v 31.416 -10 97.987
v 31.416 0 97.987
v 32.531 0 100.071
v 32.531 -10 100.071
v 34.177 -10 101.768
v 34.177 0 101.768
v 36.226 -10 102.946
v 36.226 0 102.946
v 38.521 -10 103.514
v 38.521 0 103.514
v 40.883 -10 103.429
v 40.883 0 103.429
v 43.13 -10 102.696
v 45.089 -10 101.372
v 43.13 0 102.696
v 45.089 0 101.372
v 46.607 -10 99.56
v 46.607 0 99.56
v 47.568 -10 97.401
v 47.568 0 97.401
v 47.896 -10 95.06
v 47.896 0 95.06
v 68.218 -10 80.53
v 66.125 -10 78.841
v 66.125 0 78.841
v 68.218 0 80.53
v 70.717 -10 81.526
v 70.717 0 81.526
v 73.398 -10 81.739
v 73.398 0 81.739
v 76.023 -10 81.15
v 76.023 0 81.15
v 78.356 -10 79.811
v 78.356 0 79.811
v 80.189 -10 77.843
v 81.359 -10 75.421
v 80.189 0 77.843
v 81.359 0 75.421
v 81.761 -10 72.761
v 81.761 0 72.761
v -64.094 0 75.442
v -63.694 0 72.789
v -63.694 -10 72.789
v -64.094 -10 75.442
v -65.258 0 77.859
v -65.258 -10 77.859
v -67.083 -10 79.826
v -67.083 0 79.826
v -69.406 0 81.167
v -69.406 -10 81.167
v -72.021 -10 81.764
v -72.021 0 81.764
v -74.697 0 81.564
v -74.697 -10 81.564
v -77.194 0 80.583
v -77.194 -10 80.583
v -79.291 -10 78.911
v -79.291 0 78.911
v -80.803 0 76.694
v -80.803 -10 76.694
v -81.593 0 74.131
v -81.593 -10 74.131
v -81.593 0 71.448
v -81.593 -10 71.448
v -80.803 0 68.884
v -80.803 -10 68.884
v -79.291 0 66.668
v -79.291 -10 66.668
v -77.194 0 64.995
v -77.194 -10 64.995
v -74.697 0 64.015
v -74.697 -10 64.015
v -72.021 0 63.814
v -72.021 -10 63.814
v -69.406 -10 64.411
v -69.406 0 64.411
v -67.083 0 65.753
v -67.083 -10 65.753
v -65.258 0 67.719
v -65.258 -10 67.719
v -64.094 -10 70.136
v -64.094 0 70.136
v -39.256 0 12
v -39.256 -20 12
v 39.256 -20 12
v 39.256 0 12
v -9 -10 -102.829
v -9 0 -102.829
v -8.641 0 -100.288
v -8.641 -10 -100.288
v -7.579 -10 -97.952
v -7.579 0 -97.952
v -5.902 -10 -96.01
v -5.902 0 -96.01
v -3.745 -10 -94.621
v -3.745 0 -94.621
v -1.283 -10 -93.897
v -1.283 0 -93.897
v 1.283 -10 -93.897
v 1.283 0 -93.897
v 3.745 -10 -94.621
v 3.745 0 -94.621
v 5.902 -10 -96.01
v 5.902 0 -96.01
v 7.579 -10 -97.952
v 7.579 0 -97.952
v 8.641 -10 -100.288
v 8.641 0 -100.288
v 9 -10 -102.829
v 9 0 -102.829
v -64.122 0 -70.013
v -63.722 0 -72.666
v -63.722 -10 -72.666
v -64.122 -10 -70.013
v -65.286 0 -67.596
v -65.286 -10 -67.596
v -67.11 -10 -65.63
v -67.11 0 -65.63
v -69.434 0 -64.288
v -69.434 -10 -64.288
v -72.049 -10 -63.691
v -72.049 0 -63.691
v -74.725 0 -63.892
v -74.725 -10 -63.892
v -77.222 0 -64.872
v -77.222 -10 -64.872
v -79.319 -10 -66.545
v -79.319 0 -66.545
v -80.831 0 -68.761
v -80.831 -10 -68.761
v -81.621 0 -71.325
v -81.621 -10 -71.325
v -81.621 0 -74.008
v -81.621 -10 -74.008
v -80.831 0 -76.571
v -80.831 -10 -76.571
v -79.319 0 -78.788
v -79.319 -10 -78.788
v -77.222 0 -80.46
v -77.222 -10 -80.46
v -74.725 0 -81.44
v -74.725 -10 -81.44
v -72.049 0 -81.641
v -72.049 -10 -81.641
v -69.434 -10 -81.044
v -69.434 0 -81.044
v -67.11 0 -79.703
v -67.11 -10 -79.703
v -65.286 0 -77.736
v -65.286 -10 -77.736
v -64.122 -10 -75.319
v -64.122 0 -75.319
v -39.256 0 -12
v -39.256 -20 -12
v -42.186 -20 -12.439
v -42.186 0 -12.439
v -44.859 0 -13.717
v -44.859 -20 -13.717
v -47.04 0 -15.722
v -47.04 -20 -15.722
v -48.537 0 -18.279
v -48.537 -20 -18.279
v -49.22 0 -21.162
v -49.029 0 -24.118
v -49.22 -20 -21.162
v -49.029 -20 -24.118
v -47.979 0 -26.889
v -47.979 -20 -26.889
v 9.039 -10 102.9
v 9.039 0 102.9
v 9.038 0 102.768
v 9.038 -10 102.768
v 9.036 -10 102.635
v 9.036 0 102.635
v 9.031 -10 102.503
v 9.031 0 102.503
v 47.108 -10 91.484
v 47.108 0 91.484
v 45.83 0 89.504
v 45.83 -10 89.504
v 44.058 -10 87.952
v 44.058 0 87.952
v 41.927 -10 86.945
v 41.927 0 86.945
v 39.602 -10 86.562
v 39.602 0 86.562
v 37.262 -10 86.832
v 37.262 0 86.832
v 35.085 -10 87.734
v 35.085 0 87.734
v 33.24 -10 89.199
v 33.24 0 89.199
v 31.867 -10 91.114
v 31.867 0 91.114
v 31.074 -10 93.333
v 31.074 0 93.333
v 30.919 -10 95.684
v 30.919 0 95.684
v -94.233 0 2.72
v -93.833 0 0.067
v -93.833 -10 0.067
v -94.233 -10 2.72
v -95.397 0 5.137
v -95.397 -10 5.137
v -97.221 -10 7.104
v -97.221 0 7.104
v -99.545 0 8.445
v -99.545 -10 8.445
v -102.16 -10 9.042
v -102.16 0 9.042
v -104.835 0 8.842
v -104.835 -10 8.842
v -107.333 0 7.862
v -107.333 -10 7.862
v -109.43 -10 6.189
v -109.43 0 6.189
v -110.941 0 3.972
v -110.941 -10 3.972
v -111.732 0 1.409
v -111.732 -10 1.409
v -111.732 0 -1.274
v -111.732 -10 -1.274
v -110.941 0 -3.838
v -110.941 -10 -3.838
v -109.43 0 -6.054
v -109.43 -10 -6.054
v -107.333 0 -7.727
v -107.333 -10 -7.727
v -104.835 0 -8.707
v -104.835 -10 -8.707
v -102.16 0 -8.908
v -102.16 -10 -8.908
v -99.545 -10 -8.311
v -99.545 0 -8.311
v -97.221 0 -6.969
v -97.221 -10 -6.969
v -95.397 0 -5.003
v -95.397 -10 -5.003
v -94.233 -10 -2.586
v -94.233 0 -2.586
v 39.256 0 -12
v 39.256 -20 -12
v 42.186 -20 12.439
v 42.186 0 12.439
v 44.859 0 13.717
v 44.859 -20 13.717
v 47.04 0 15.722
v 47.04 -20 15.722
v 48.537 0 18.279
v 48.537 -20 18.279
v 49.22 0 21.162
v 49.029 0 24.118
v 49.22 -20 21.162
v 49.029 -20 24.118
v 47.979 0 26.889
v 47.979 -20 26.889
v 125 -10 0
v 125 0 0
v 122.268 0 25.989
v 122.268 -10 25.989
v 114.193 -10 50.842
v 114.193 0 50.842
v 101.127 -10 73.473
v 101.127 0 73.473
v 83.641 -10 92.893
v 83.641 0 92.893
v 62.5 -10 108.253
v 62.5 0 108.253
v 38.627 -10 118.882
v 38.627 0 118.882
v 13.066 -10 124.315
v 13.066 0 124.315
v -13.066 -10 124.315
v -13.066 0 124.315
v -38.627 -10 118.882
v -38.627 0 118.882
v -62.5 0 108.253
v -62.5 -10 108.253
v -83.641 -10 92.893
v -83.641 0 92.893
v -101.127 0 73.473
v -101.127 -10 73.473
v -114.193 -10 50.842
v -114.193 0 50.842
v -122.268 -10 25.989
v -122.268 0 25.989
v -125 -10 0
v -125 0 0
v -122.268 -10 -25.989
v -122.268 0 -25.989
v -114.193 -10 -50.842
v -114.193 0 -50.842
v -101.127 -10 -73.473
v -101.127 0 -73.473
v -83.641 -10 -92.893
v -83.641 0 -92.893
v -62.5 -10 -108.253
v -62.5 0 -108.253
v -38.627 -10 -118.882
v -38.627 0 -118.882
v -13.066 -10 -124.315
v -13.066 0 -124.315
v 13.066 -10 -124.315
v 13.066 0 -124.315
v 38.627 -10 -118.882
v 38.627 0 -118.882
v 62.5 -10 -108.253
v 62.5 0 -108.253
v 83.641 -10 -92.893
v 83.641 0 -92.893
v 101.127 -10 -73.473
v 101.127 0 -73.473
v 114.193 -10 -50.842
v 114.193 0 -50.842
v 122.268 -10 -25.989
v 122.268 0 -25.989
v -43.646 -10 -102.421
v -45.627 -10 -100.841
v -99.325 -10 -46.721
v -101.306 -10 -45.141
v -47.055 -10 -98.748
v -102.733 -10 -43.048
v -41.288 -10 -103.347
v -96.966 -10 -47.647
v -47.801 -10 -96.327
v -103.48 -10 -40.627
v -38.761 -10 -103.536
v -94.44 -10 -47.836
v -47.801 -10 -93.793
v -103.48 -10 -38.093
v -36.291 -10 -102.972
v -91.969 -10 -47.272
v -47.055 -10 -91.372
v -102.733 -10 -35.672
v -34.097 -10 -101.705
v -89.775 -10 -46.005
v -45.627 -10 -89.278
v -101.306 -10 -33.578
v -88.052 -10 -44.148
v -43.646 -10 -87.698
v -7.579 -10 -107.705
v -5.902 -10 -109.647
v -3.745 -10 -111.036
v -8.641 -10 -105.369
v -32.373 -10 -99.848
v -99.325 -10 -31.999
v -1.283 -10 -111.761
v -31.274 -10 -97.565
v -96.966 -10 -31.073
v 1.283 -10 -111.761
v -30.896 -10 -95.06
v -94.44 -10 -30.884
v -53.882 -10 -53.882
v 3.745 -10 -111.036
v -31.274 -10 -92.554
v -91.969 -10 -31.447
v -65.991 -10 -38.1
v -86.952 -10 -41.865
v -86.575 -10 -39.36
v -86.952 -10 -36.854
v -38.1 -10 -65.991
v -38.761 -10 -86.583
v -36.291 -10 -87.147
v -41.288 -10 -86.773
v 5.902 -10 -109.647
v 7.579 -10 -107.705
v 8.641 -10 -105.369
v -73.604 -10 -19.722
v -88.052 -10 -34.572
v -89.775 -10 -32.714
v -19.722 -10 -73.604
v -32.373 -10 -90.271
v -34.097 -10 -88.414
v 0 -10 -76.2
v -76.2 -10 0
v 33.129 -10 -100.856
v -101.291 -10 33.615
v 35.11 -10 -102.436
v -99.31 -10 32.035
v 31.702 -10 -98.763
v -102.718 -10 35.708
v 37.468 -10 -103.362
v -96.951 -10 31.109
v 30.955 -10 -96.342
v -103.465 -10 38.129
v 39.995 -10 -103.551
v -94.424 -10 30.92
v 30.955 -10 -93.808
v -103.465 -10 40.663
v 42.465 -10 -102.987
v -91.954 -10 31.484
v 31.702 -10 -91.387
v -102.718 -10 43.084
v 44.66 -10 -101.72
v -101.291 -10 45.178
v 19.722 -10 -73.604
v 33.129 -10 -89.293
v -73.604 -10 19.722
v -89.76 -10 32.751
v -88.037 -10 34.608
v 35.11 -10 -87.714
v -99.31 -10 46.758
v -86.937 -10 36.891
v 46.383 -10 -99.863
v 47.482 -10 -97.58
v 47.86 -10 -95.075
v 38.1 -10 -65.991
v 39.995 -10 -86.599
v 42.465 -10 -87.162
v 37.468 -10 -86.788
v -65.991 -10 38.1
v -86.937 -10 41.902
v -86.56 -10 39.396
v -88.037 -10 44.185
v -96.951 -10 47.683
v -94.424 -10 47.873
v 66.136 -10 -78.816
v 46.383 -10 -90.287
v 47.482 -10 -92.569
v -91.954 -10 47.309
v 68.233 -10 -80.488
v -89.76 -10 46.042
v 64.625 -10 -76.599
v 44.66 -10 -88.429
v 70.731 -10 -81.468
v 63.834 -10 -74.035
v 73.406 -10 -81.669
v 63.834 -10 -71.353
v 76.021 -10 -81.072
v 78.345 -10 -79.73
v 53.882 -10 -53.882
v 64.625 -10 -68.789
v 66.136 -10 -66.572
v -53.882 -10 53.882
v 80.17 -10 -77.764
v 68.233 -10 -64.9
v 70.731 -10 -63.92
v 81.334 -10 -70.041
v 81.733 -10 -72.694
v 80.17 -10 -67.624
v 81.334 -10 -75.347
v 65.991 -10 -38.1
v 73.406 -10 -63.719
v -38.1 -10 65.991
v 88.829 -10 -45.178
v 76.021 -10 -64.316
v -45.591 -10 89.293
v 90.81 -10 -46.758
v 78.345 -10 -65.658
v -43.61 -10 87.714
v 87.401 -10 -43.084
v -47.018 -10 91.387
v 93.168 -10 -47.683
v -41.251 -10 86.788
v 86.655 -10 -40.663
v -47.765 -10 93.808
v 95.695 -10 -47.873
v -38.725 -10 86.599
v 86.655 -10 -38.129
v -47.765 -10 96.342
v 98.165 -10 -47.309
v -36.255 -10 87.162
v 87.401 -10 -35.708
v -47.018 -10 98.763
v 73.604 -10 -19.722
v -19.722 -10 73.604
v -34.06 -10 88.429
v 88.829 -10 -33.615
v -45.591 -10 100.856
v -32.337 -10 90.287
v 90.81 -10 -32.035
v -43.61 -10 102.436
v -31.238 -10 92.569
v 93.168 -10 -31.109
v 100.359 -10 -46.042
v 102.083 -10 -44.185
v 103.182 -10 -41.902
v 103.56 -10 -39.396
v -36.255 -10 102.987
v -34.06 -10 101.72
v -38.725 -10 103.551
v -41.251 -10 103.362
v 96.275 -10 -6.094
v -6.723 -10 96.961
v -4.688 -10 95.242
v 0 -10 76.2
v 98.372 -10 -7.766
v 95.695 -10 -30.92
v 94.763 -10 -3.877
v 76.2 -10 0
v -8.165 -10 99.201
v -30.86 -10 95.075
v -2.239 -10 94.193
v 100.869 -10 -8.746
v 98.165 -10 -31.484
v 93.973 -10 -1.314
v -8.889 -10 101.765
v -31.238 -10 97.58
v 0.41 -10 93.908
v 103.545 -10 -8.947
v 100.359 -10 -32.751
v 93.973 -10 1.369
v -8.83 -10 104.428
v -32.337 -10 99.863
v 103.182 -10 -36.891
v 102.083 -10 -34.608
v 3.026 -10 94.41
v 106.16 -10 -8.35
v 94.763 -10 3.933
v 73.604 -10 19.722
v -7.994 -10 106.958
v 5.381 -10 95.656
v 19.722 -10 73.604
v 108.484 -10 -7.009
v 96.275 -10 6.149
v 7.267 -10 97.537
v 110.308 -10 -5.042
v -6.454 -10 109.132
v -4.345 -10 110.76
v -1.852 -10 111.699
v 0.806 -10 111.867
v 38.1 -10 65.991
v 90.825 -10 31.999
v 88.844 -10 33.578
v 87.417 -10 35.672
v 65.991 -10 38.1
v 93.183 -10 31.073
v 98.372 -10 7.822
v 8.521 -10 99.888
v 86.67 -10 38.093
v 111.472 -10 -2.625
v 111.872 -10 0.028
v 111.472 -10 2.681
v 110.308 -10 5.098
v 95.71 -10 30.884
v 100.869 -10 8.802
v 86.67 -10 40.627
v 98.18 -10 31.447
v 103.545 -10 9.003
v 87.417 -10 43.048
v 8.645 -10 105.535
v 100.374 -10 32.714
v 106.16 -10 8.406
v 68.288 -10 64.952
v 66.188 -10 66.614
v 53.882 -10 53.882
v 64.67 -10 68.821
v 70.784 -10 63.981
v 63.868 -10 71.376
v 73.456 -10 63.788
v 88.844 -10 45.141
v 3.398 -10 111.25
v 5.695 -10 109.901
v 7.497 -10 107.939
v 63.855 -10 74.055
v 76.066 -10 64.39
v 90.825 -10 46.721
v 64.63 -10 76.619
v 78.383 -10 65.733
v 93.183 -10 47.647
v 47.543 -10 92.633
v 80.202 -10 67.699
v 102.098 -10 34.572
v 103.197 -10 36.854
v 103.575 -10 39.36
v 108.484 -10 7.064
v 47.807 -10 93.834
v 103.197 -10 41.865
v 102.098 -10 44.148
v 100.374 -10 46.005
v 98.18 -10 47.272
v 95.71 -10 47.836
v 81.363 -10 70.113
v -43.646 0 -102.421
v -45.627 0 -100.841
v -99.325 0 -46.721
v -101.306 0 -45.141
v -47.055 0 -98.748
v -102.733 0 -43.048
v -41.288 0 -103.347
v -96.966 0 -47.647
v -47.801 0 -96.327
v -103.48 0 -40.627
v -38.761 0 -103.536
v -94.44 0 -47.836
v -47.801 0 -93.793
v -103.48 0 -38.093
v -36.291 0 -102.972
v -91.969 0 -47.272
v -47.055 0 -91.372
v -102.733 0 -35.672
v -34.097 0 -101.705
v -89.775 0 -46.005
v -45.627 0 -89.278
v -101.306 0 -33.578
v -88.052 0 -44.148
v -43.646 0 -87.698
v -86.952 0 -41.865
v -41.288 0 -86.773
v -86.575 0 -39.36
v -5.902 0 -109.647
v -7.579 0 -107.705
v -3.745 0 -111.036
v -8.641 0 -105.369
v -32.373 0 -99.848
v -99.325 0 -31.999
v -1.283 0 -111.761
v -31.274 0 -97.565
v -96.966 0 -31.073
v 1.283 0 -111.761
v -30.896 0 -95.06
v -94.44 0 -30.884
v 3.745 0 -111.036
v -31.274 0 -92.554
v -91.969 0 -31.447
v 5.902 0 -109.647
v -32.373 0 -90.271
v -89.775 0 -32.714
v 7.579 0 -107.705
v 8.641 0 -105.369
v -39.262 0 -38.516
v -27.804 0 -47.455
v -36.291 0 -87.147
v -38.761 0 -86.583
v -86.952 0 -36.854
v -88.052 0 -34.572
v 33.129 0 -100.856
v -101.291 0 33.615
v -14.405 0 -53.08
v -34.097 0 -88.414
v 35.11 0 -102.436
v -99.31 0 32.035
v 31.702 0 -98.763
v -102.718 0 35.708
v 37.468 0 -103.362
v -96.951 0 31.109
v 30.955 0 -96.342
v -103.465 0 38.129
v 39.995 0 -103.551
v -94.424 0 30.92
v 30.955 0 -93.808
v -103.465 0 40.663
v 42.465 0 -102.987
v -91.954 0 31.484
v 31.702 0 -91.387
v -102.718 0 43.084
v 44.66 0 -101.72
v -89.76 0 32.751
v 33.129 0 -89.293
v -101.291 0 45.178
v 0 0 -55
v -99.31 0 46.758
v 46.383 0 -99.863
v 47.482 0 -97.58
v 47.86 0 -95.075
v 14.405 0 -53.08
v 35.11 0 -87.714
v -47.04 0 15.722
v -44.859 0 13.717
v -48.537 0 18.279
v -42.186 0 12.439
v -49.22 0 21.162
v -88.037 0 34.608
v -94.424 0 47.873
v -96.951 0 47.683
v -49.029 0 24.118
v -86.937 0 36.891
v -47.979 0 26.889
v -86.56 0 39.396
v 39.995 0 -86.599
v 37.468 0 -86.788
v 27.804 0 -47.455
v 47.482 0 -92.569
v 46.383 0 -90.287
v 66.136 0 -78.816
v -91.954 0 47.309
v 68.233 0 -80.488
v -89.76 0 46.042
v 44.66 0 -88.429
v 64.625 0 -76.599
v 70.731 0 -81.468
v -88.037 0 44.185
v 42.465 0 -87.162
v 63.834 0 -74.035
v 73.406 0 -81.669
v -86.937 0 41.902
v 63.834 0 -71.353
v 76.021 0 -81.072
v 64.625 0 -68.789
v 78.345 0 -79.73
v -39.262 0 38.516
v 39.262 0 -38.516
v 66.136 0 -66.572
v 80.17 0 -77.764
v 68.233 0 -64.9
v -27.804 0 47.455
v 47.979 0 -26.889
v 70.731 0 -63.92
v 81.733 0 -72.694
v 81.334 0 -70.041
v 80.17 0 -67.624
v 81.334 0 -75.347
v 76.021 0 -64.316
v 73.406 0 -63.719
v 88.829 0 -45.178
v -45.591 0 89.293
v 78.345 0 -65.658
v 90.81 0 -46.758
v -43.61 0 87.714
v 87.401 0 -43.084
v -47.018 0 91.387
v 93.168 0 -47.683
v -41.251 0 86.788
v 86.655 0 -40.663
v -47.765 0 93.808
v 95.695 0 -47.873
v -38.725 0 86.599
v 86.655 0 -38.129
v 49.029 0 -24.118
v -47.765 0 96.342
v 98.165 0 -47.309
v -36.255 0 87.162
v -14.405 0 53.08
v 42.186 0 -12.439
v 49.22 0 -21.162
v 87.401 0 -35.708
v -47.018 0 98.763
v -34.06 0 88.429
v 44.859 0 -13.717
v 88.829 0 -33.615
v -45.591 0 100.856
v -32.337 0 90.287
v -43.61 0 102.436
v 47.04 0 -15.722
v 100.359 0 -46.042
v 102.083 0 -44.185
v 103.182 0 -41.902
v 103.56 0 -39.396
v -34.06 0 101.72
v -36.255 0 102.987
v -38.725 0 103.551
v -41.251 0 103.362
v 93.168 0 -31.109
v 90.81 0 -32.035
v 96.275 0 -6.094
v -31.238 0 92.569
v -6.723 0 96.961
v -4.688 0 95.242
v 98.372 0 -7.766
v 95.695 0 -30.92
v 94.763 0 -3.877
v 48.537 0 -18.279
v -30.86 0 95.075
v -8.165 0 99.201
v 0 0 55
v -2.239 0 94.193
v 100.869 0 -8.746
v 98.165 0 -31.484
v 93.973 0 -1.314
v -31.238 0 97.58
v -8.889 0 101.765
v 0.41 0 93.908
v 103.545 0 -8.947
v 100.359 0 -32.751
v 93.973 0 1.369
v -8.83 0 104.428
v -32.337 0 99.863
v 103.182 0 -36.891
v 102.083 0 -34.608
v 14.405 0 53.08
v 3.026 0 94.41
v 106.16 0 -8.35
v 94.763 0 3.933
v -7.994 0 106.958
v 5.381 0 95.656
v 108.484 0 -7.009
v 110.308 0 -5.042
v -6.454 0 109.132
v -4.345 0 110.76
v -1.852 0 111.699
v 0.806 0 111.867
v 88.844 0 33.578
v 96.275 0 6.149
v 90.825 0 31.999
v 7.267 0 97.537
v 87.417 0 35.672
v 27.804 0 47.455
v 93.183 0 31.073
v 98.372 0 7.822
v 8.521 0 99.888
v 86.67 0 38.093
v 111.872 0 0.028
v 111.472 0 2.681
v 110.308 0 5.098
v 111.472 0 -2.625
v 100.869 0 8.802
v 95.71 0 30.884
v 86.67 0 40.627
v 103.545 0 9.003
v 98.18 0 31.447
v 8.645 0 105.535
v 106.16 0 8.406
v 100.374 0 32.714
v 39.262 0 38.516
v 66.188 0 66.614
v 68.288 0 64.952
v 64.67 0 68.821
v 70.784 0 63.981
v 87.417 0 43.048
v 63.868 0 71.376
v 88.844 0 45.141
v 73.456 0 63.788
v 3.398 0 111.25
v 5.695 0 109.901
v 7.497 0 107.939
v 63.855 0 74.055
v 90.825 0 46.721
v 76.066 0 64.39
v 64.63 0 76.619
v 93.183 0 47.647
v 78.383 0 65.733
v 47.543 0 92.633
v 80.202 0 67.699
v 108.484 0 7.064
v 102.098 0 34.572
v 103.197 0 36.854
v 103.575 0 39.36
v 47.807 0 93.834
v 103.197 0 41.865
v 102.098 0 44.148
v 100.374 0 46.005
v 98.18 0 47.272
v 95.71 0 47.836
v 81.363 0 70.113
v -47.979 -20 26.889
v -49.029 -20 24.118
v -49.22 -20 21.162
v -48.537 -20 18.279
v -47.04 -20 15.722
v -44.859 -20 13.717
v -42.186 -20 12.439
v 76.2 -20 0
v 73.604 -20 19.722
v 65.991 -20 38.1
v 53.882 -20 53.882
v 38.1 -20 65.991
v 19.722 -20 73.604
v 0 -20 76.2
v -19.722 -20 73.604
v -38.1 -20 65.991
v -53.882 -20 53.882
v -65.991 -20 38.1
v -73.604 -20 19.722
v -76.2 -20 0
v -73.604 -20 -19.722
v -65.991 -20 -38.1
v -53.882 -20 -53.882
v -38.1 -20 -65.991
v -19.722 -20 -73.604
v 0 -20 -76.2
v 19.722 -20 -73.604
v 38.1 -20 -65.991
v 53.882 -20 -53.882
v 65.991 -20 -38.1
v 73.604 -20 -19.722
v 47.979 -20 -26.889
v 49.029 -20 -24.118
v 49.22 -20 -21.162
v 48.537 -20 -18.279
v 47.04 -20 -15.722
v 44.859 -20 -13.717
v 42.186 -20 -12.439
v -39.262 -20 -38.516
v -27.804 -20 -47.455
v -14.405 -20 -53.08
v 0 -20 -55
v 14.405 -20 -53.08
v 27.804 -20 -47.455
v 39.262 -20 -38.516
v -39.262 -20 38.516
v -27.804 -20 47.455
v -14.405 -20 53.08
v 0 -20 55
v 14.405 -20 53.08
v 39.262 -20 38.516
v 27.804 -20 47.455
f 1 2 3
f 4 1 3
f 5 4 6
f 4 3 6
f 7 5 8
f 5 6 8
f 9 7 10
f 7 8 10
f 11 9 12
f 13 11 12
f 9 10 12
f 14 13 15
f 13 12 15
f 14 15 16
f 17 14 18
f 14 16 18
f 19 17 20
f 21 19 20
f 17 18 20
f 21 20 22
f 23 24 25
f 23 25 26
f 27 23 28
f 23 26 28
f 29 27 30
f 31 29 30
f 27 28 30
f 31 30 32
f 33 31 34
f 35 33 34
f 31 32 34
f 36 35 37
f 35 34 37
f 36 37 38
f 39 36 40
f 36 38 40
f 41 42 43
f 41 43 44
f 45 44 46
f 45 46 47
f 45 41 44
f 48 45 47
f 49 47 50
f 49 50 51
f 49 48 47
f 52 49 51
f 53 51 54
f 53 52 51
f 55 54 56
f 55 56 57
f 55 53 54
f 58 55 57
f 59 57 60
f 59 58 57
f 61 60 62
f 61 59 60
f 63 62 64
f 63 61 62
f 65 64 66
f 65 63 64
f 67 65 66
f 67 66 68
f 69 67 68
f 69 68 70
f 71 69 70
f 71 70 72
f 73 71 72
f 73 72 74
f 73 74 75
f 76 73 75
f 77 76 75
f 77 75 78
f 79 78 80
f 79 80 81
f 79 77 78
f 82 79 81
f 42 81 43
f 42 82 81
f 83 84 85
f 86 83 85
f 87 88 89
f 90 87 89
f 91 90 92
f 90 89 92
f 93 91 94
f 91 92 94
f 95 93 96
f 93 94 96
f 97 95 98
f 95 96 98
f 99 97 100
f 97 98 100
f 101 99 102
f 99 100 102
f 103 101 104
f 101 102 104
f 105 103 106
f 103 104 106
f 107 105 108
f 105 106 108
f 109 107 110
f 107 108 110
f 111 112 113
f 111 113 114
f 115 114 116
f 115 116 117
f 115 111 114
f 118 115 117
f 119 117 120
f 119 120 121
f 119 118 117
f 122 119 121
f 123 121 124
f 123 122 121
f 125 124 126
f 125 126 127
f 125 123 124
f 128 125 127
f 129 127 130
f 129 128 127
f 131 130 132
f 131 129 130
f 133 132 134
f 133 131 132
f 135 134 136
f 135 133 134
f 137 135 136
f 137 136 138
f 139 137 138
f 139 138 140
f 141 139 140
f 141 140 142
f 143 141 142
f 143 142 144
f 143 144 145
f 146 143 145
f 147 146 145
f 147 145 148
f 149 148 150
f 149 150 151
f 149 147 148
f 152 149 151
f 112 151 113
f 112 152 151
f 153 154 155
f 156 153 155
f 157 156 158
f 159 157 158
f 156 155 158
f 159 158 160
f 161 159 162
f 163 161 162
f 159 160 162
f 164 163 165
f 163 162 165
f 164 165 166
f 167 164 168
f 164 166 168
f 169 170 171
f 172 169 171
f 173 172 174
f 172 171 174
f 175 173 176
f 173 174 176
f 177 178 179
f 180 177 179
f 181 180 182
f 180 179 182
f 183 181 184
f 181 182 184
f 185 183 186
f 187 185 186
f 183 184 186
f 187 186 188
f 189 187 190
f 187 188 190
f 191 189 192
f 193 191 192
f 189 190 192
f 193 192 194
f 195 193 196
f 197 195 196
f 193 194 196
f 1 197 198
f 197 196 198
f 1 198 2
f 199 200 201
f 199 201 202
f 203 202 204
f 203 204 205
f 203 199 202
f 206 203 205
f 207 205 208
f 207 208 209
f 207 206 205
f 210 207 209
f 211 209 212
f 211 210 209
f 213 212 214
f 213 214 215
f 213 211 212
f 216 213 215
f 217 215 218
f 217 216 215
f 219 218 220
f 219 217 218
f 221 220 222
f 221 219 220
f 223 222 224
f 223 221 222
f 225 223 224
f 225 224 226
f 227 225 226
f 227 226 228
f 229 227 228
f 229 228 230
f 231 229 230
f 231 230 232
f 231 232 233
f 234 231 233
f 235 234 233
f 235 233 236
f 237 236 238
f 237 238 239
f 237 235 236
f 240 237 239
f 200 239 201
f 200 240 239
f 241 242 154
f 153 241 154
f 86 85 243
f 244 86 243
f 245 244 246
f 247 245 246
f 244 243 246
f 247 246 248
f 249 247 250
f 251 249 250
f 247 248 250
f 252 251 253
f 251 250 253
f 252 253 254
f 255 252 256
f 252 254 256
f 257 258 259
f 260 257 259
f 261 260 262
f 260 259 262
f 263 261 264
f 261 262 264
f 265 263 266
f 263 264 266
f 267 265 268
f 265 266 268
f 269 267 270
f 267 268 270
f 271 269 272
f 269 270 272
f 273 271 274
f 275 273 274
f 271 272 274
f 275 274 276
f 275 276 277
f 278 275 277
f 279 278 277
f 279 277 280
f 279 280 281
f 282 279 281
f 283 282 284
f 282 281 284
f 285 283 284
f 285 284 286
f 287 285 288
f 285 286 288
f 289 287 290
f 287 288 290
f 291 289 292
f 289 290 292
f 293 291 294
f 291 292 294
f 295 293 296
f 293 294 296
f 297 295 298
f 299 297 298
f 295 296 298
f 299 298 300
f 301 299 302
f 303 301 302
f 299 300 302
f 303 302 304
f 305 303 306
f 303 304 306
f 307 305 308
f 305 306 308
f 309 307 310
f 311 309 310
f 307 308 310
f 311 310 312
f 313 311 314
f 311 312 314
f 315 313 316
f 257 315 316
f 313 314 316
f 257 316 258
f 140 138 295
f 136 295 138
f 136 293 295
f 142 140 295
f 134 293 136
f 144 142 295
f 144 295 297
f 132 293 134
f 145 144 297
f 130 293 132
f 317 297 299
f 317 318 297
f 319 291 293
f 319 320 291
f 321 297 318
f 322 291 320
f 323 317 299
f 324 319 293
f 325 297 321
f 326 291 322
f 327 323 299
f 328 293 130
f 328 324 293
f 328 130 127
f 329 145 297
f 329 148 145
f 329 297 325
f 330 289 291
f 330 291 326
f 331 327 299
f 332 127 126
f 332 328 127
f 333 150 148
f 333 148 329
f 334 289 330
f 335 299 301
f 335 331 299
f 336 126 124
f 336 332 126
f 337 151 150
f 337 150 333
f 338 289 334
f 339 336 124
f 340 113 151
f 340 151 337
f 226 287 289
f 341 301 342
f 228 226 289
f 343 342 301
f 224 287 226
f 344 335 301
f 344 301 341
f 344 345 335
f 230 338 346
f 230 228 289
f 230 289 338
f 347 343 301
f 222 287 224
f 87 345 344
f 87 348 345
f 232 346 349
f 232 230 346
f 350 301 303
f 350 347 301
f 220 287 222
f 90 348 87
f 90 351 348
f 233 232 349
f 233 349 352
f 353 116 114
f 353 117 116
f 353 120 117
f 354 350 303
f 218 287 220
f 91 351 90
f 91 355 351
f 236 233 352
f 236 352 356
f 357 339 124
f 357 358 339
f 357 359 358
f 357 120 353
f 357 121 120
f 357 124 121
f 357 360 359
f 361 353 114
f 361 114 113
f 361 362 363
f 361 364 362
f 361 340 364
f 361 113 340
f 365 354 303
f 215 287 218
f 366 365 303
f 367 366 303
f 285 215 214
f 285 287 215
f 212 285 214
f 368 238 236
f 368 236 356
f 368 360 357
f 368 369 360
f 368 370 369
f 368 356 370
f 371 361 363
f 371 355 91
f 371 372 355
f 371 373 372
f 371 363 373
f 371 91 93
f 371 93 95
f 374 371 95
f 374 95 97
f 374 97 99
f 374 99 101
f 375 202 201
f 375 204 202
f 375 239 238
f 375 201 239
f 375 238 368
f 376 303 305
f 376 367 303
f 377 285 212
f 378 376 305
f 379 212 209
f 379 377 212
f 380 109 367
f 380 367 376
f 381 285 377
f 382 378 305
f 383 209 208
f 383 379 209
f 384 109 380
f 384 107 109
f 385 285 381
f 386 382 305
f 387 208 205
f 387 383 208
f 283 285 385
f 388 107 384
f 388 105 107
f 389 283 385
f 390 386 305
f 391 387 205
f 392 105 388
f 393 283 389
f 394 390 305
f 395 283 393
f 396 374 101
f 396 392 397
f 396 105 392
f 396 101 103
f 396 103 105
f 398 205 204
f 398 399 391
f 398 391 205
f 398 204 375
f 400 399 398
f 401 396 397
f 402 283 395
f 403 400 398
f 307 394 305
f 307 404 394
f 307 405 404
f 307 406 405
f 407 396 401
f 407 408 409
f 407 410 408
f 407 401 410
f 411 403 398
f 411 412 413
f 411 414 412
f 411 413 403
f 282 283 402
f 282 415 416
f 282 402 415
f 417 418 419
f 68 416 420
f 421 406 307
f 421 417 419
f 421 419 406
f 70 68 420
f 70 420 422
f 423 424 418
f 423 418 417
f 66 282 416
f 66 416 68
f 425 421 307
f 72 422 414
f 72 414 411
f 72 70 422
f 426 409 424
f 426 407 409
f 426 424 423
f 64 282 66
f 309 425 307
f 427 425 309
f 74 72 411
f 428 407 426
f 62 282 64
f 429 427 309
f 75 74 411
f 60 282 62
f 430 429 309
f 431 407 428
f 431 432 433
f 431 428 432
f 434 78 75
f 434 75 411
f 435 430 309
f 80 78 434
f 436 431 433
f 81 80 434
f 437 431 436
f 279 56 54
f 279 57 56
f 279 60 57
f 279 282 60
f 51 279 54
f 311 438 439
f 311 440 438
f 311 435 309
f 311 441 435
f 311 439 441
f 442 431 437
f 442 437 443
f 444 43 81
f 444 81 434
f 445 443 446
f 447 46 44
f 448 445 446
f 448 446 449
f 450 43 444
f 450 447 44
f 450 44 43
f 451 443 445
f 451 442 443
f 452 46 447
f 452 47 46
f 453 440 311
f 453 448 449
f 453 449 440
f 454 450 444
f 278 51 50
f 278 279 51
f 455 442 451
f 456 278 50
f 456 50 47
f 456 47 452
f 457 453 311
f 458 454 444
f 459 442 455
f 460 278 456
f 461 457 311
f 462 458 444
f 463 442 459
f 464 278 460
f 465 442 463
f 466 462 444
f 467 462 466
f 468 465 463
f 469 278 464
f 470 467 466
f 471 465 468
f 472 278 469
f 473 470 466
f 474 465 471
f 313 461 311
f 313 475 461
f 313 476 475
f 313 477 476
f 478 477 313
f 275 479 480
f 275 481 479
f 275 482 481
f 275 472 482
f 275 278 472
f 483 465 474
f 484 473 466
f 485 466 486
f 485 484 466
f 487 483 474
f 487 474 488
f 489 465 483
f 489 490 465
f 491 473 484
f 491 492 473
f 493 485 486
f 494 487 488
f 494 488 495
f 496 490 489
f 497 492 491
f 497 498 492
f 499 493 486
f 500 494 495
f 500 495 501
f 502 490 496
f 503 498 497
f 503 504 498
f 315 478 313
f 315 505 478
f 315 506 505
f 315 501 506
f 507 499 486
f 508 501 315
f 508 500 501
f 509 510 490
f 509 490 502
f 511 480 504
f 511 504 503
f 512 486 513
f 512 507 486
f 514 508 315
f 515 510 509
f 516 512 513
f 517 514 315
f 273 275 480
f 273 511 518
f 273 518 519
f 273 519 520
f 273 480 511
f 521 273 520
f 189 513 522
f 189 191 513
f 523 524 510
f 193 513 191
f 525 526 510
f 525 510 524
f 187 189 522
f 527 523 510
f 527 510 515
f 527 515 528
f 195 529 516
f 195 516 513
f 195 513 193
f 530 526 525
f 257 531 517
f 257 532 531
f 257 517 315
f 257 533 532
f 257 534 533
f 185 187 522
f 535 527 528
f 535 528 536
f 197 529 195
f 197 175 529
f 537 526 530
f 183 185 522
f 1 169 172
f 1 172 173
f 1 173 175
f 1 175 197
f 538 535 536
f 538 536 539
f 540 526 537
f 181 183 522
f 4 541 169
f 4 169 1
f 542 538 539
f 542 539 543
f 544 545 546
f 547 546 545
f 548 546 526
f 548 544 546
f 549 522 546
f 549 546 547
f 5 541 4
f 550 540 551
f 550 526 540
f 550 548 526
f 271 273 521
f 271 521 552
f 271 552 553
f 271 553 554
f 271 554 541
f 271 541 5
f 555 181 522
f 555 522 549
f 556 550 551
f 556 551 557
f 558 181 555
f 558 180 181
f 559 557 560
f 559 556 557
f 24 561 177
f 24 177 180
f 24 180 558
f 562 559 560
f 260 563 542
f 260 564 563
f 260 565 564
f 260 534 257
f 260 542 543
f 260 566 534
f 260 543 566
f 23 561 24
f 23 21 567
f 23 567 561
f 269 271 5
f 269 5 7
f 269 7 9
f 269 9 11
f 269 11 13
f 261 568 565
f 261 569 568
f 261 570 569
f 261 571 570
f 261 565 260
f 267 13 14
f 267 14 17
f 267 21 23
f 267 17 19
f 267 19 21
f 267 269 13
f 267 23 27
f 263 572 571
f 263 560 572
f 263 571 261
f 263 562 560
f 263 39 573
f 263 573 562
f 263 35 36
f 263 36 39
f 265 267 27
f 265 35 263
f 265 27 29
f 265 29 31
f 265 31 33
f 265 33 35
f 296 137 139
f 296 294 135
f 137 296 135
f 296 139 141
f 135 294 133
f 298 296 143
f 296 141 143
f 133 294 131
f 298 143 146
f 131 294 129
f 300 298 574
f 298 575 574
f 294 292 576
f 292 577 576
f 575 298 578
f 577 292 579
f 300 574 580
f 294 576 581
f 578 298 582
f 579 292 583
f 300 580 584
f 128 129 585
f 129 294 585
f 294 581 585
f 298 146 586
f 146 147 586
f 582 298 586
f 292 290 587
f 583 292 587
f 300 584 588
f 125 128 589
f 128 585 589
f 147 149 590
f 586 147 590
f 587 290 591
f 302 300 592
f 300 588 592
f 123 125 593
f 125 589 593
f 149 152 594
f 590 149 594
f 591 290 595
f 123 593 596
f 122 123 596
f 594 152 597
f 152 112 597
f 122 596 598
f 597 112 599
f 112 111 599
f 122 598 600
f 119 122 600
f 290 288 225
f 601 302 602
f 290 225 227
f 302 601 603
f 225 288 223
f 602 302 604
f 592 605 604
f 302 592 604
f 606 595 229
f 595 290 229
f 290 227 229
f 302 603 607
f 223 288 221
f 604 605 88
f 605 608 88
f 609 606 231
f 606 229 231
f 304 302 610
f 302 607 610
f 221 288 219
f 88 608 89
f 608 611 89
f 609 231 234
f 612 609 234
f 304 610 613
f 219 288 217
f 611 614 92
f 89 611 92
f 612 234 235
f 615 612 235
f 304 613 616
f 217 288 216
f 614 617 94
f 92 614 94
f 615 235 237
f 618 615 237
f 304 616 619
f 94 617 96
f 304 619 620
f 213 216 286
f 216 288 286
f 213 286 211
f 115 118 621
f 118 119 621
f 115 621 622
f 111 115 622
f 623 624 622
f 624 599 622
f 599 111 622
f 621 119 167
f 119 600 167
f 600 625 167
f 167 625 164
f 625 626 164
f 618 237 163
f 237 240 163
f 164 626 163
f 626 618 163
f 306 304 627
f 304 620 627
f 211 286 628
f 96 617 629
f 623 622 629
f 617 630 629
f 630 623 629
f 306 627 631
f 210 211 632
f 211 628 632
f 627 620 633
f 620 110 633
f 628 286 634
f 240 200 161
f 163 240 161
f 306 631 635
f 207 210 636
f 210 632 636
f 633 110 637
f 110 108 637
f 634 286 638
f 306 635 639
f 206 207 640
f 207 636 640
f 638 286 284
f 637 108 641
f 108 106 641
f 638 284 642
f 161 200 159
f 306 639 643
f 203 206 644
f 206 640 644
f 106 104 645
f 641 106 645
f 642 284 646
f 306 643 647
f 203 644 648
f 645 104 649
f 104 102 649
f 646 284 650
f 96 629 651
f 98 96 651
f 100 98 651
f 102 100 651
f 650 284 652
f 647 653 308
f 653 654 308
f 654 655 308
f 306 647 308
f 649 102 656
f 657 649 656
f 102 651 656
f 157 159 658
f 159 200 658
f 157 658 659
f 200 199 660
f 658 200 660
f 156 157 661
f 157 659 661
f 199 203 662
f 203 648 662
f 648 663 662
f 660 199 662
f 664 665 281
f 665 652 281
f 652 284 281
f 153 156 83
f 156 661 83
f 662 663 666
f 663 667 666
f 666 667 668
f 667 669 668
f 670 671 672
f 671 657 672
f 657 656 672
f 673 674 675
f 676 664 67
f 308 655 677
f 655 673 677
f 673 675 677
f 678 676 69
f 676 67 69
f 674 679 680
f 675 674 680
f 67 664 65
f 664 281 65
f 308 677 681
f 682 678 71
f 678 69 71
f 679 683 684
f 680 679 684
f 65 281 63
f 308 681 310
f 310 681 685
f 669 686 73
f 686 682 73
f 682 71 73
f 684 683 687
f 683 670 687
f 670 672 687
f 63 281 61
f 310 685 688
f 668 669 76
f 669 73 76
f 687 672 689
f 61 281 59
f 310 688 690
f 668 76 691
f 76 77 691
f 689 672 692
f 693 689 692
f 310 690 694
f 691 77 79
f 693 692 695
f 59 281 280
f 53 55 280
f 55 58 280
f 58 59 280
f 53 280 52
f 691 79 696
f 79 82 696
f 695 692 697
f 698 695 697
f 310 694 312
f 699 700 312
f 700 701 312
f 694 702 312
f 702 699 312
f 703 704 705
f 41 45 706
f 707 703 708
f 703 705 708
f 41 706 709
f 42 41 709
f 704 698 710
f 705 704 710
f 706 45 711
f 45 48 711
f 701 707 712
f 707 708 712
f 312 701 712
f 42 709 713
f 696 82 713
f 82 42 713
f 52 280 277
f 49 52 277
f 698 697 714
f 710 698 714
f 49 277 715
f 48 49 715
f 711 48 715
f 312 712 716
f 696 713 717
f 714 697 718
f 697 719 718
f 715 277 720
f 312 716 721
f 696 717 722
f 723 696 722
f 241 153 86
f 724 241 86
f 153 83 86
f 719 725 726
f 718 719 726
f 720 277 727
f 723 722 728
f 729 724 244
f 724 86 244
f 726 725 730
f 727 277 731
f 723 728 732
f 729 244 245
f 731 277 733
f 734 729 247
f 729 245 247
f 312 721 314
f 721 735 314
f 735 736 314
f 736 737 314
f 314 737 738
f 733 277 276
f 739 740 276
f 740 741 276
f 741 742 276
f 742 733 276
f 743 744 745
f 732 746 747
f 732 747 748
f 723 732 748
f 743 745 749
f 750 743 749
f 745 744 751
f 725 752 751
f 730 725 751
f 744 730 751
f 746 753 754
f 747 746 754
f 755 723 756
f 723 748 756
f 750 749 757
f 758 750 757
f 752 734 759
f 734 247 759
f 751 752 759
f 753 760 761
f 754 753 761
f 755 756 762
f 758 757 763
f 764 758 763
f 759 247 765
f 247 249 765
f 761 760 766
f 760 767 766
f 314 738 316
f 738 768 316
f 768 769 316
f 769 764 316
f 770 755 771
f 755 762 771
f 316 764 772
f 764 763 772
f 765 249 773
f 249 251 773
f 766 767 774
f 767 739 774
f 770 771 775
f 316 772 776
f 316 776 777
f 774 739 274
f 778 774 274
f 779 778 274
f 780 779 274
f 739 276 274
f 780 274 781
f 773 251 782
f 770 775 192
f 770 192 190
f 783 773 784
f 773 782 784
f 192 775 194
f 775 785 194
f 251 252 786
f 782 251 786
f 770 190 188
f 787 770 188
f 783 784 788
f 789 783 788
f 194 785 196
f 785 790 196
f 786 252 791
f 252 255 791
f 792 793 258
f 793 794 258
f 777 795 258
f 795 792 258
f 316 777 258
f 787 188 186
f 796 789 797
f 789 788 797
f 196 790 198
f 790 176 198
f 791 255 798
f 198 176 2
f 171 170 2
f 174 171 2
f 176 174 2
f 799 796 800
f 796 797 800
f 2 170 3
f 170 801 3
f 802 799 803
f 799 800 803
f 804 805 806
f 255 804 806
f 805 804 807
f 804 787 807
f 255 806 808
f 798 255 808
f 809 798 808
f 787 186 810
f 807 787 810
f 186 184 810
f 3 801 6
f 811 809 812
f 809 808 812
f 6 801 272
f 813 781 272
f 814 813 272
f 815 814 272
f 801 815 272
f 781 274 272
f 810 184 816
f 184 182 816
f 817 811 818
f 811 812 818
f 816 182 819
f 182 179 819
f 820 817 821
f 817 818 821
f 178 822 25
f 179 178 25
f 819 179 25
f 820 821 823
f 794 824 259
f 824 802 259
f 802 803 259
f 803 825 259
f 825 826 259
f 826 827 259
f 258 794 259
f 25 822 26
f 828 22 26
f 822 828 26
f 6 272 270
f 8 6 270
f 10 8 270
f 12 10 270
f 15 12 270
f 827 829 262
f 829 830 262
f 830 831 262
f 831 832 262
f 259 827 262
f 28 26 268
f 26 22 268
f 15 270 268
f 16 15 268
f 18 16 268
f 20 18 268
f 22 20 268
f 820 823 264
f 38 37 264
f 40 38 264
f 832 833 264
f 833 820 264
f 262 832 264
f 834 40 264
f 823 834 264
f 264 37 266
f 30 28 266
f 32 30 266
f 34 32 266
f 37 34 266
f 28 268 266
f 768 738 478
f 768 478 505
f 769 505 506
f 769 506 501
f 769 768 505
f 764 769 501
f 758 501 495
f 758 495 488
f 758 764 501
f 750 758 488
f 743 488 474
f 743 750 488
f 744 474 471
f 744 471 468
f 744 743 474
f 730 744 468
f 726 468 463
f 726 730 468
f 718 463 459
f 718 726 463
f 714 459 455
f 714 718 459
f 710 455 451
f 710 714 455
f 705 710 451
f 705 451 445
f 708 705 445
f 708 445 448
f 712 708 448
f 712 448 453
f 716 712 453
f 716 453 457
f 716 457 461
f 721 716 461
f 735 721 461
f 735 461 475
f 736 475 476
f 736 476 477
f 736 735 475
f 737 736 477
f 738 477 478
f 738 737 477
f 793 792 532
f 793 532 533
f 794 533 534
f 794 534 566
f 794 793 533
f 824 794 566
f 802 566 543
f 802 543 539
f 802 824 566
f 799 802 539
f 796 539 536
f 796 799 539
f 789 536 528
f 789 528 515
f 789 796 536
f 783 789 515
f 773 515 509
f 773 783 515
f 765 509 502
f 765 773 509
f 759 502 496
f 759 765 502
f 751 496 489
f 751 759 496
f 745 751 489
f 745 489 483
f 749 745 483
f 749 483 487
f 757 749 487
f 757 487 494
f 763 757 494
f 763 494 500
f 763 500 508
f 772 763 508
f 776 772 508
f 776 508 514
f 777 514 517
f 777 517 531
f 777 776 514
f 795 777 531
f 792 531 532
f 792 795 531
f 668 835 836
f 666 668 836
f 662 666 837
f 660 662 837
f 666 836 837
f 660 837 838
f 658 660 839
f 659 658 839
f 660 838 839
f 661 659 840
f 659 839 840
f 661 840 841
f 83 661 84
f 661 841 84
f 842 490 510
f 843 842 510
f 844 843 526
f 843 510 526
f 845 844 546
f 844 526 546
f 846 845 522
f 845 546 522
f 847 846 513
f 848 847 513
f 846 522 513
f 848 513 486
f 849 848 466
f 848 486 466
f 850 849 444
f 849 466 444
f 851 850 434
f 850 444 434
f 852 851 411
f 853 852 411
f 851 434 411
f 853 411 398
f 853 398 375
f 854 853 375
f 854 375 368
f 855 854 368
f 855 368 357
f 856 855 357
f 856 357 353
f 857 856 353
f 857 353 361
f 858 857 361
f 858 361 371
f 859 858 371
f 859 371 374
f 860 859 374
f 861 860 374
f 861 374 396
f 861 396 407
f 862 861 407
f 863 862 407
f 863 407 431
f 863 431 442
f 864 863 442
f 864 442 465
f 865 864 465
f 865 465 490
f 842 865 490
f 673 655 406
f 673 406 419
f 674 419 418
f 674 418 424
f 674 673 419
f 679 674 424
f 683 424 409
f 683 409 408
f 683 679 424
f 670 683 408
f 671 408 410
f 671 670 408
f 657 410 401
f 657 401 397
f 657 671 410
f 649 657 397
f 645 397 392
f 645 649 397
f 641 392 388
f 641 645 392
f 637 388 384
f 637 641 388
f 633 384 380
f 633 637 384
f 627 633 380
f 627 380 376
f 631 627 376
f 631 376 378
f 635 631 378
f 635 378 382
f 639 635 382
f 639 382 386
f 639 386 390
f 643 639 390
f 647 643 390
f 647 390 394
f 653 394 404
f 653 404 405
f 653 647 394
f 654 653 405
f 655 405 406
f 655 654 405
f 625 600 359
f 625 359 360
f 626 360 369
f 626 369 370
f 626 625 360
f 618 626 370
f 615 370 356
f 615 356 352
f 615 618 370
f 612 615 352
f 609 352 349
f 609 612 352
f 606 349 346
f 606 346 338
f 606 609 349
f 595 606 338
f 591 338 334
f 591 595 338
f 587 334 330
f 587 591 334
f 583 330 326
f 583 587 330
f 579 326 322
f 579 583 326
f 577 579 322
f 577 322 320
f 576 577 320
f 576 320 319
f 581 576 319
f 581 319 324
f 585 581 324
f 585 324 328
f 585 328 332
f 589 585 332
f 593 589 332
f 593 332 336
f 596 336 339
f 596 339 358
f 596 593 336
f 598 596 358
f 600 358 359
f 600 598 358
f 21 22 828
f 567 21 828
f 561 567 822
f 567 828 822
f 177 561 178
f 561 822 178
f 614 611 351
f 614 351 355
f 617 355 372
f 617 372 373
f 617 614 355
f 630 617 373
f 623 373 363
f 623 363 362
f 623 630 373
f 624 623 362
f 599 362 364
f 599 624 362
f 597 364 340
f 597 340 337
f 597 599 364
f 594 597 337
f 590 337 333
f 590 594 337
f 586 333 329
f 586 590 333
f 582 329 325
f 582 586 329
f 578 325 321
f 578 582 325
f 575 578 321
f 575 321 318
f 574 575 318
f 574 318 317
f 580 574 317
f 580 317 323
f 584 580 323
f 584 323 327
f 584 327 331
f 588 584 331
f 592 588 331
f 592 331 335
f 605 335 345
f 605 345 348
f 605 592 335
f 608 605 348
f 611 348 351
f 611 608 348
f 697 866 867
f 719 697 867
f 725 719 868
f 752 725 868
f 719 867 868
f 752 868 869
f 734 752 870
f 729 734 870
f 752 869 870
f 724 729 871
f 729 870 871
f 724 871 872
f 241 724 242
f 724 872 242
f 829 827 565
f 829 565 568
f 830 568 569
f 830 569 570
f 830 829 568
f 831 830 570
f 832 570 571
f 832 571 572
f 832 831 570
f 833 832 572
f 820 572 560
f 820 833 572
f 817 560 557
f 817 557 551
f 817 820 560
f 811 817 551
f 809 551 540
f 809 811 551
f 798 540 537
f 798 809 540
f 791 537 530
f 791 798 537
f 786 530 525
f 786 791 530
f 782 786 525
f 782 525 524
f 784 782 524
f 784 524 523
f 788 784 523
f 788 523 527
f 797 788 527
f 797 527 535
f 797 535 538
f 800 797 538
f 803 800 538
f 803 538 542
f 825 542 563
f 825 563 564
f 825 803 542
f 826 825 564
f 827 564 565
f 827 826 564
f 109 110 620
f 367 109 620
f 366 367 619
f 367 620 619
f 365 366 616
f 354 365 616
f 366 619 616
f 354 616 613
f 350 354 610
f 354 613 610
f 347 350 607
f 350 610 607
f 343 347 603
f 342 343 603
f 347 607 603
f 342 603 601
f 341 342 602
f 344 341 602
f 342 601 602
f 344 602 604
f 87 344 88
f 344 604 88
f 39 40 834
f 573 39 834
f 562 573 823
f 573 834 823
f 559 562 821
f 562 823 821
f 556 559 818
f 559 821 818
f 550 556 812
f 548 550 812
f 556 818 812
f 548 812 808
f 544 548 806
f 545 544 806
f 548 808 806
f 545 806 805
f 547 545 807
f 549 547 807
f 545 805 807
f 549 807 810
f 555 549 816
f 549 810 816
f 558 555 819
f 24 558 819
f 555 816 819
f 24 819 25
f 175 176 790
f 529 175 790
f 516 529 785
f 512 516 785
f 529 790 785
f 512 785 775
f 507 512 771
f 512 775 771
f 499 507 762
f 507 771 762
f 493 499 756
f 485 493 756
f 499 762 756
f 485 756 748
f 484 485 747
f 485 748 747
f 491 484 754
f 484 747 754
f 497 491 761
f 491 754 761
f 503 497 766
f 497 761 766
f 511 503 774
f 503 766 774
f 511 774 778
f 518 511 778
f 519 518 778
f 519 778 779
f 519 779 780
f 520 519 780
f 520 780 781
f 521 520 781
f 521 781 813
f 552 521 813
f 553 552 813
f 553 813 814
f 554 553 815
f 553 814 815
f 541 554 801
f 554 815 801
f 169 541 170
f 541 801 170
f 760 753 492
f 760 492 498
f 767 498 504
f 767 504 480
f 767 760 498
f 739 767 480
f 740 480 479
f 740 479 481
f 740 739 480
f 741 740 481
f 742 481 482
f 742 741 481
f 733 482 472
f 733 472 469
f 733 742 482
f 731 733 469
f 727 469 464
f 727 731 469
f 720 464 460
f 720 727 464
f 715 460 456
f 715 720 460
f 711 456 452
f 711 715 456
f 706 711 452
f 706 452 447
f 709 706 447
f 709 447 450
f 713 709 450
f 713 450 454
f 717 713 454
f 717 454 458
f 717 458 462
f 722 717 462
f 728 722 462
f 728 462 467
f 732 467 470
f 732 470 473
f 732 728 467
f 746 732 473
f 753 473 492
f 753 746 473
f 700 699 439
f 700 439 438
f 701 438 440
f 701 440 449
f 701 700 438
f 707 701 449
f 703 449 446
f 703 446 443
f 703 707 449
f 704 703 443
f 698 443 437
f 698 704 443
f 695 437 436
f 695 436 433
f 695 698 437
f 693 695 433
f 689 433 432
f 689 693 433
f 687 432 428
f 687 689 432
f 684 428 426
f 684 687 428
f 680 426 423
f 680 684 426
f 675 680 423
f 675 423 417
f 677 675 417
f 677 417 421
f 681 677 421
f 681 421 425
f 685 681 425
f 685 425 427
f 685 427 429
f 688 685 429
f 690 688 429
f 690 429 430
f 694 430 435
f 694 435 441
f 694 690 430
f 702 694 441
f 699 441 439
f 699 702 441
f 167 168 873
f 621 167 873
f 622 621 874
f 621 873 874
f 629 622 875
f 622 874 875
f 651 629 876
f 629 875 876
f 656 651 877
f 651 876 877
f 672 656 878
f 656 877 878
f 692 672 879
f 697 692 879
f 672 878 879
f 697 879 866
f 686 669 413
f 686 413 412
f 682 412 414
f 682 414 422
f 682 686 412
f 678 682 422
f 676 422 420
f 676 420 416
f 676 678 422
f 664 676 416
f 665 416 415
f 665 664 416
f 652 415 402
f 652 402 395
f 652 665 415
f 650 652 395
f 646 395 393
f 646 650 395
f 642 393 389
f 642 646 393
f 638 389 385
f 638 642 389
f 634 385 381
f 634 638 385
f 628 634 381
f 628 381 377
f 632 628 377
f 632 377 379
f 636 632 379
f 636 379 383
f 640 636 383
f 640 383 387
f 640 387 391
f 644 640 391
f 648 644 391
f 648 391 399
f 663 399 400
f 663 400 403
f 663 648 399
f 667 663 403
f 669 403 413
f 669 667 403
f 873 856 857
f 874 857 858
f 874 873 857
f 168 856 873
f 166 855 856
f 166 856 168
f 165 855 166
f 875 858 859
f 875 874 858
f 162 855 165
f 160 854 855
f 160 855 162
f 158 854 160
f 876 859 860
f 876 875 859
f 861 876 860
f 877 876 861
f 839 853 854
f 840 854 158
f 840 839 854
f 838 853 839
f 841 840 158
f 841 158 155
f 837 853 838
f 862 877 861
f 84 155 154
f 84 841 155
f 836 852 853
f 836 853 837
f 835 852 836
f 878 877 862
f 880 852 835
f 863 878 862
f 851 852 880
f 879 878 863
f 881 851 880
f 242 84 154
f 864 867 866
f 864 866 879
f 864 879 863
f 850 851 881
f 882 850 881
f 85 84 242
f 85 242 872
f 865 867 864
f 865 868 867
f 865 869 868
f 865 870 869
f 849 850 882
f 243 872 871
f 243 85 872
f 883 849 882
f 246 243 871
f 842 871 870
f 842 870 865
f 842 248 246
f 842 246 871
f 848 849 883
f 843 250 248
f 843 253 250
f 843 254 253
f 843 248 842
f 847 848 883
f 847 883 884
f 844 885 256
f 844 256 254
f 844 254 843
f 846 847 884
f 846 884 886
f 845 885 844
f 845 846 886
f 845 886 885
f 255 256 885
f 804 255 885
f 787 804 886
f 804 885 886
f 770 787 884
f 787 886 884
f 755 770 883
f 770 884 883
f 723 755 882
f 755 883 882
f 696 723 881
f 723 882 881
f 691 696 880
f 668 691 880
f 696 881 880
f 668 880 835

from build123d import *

# Parameters (mm, degrees)
F0_R     = 125
F0_R_2   = 9
F0_R_3   = 8.5
F0_R_4   = 76.2
F1_DEPTH = 10
F2_R     = 76.2
F3_DEPTH = 20
F5_DEPTH = 25


with BuildPart() as f1:
    # F0 (on Front) → F1 (new body)
    with BuildSketch(Plane.XZ):
        Circle(F0_R)
        with Locations((-72.7218686646, -72.6661291665)):
            Circle(F0_R_2, mode=Mode.SUBTRACT)
        with Locations((-39.3963481099, -95.0596536687)):
            Circle(F0_R_3, mode=Mode.SUBTRACT)
        with Locations((-95.0747506288, -39.3599008239)):
            Circle(F0_R_3, mode=Mode.SUBTRACT)
        with Locations((0, -102.8524214745)):
            Circle(F0_R_2, mode=Mode.SUBTRACT)
        with Locations((0, -102.8048467248)):
            Circle(F0_R_2, mode=Mode.SUBTRACT)
        with Locations((39.3599008239, -95.0747506288)):
            Circle(F0_R_3, mode=Mode.SUBTRACT)
        with Locations((72.733418035, -72.6940118133)):
            Circle(F0_R_2, mode=Mode.SUBTRACT)
        with Locations((95.0596536687, -39.3963481099)):
            Circle(F0_R_3, mode=Mode.SUBTRACT)
        with Locations((-102.8327035761, 0.0672888685)):
            Circle(F0_R_2, mode=Mode.SUBTRACT)
        with Locations((-95.0596536687, 39.3963481099)):
            Circle(F0_R_3, mode=Mode.SUBTRACT)
        with Locations((-72.6939860178, 72.7891575331)):
            Circle(F0_R_2, mode=Mode.SUBTRACT)
        with Locations((-39.3599008239, 95.0747506288)):
            Circle(F0_R_3, mode=Mode.SUBTRACT)
        Circle(F0_R_4, mode=Mode.SUBTRACT)
        with Locations((102.8721355934, 0.0278568513)):
            Circle(F0_R_2, mode=Mode.SUBTRACT)
        with Locations((95.0747506288, 39.3599008239)):
            Circle(F0_R_3, mode=Mode.SUBTRACT)
        with BuildLine():
            ThreePointArc((9.0394320172, 102.8999924447), (9.0372413226, 102.7014283411), (9.0306703054, 102.5029609028))
            ThreePointArc((9.0306703054, 102.5029609028), (-8.9583772882, 103.0985565482), (9.0394320172, 102.8999924447))
        make_face(mode=Mode.SUBTRACT)
        with BuildLine():
            ThreePointArc((47.8963481099, 95.0596536687), (47.6968165425, 93.2287457523), (47.1075895691, 91.4837964067))
            ThreePointArc((47.1075895691, 91.4837964067), (36.1420336402, 87.2073013248), (31.4162857275, 97.9868715241))
            ThreePointArc((31.4162857275, 97.9868715241), (40.8828658107, 103.4286598895), (47.8963481099, 95.0596536687))
        make_face(mode=Mode.SUBTRACT)
        with BuildLine():
            ThreePointArc((66.1251217448, 78.84084141), (76.0227719424, 81.1495288892), (81.7613006818, 72.7612748864))
            ThreePointArc((81.7613006818, 72.7612748864), (69.4998294213, 64.3730208835), (66.1251217448, 78.84084141))
        make_face(mode=Mode.SUBTRACT)
    extrude(amount=F1_DEPTH)

    # F2 (on Front) → F3 (join)
    with BuildSketch(Plane.XZ):
        Circle(F2_R)
    extrude(amount=F3_DEPTH)

    # F4 (on face) → F5 (cut)
    with BuildSketch(Plane.XZ.offset(20)):
        with BuildLine():
            ThreePointArc((-47.9790334867, 26.8888888889), (-47.8836922565, 16.944749704), (-39.2555728528, 12))
            Line((-39.2555728528, 12), (39.2555728528, 12))
            ThreePointArc((39.2555728528, 12), (47.8836922565, 16.944749704), (47.9790334867, 26.8888888889))
            ThreePointArc((47.9790334867, 26.8888888889), (0, 55), (-47.9790334867, 26.8888888889))
        make_face()
        with BuildLine():
            ThreePointArc((-39.2555728528, -12), (-47.8836922565, -16.944749704), (-47.9790334867, -26.8888888889))
            ThreePointArc((-47.9790334867, -26.8888888889), (0, -55), (47.9790334867, -26.8888888889))
            ThreePointArc((47.9790334867, -26.8888888889), (47.8836922565, -16.944749704), (39.2555728528, -12))
            Line((39.2555728528, -12), (-39.2555728528, -12))
        make_face()
    extrude(amount=-F5_DEPTH, mode=Mode.SUBTRACT)


solid = f1.part
